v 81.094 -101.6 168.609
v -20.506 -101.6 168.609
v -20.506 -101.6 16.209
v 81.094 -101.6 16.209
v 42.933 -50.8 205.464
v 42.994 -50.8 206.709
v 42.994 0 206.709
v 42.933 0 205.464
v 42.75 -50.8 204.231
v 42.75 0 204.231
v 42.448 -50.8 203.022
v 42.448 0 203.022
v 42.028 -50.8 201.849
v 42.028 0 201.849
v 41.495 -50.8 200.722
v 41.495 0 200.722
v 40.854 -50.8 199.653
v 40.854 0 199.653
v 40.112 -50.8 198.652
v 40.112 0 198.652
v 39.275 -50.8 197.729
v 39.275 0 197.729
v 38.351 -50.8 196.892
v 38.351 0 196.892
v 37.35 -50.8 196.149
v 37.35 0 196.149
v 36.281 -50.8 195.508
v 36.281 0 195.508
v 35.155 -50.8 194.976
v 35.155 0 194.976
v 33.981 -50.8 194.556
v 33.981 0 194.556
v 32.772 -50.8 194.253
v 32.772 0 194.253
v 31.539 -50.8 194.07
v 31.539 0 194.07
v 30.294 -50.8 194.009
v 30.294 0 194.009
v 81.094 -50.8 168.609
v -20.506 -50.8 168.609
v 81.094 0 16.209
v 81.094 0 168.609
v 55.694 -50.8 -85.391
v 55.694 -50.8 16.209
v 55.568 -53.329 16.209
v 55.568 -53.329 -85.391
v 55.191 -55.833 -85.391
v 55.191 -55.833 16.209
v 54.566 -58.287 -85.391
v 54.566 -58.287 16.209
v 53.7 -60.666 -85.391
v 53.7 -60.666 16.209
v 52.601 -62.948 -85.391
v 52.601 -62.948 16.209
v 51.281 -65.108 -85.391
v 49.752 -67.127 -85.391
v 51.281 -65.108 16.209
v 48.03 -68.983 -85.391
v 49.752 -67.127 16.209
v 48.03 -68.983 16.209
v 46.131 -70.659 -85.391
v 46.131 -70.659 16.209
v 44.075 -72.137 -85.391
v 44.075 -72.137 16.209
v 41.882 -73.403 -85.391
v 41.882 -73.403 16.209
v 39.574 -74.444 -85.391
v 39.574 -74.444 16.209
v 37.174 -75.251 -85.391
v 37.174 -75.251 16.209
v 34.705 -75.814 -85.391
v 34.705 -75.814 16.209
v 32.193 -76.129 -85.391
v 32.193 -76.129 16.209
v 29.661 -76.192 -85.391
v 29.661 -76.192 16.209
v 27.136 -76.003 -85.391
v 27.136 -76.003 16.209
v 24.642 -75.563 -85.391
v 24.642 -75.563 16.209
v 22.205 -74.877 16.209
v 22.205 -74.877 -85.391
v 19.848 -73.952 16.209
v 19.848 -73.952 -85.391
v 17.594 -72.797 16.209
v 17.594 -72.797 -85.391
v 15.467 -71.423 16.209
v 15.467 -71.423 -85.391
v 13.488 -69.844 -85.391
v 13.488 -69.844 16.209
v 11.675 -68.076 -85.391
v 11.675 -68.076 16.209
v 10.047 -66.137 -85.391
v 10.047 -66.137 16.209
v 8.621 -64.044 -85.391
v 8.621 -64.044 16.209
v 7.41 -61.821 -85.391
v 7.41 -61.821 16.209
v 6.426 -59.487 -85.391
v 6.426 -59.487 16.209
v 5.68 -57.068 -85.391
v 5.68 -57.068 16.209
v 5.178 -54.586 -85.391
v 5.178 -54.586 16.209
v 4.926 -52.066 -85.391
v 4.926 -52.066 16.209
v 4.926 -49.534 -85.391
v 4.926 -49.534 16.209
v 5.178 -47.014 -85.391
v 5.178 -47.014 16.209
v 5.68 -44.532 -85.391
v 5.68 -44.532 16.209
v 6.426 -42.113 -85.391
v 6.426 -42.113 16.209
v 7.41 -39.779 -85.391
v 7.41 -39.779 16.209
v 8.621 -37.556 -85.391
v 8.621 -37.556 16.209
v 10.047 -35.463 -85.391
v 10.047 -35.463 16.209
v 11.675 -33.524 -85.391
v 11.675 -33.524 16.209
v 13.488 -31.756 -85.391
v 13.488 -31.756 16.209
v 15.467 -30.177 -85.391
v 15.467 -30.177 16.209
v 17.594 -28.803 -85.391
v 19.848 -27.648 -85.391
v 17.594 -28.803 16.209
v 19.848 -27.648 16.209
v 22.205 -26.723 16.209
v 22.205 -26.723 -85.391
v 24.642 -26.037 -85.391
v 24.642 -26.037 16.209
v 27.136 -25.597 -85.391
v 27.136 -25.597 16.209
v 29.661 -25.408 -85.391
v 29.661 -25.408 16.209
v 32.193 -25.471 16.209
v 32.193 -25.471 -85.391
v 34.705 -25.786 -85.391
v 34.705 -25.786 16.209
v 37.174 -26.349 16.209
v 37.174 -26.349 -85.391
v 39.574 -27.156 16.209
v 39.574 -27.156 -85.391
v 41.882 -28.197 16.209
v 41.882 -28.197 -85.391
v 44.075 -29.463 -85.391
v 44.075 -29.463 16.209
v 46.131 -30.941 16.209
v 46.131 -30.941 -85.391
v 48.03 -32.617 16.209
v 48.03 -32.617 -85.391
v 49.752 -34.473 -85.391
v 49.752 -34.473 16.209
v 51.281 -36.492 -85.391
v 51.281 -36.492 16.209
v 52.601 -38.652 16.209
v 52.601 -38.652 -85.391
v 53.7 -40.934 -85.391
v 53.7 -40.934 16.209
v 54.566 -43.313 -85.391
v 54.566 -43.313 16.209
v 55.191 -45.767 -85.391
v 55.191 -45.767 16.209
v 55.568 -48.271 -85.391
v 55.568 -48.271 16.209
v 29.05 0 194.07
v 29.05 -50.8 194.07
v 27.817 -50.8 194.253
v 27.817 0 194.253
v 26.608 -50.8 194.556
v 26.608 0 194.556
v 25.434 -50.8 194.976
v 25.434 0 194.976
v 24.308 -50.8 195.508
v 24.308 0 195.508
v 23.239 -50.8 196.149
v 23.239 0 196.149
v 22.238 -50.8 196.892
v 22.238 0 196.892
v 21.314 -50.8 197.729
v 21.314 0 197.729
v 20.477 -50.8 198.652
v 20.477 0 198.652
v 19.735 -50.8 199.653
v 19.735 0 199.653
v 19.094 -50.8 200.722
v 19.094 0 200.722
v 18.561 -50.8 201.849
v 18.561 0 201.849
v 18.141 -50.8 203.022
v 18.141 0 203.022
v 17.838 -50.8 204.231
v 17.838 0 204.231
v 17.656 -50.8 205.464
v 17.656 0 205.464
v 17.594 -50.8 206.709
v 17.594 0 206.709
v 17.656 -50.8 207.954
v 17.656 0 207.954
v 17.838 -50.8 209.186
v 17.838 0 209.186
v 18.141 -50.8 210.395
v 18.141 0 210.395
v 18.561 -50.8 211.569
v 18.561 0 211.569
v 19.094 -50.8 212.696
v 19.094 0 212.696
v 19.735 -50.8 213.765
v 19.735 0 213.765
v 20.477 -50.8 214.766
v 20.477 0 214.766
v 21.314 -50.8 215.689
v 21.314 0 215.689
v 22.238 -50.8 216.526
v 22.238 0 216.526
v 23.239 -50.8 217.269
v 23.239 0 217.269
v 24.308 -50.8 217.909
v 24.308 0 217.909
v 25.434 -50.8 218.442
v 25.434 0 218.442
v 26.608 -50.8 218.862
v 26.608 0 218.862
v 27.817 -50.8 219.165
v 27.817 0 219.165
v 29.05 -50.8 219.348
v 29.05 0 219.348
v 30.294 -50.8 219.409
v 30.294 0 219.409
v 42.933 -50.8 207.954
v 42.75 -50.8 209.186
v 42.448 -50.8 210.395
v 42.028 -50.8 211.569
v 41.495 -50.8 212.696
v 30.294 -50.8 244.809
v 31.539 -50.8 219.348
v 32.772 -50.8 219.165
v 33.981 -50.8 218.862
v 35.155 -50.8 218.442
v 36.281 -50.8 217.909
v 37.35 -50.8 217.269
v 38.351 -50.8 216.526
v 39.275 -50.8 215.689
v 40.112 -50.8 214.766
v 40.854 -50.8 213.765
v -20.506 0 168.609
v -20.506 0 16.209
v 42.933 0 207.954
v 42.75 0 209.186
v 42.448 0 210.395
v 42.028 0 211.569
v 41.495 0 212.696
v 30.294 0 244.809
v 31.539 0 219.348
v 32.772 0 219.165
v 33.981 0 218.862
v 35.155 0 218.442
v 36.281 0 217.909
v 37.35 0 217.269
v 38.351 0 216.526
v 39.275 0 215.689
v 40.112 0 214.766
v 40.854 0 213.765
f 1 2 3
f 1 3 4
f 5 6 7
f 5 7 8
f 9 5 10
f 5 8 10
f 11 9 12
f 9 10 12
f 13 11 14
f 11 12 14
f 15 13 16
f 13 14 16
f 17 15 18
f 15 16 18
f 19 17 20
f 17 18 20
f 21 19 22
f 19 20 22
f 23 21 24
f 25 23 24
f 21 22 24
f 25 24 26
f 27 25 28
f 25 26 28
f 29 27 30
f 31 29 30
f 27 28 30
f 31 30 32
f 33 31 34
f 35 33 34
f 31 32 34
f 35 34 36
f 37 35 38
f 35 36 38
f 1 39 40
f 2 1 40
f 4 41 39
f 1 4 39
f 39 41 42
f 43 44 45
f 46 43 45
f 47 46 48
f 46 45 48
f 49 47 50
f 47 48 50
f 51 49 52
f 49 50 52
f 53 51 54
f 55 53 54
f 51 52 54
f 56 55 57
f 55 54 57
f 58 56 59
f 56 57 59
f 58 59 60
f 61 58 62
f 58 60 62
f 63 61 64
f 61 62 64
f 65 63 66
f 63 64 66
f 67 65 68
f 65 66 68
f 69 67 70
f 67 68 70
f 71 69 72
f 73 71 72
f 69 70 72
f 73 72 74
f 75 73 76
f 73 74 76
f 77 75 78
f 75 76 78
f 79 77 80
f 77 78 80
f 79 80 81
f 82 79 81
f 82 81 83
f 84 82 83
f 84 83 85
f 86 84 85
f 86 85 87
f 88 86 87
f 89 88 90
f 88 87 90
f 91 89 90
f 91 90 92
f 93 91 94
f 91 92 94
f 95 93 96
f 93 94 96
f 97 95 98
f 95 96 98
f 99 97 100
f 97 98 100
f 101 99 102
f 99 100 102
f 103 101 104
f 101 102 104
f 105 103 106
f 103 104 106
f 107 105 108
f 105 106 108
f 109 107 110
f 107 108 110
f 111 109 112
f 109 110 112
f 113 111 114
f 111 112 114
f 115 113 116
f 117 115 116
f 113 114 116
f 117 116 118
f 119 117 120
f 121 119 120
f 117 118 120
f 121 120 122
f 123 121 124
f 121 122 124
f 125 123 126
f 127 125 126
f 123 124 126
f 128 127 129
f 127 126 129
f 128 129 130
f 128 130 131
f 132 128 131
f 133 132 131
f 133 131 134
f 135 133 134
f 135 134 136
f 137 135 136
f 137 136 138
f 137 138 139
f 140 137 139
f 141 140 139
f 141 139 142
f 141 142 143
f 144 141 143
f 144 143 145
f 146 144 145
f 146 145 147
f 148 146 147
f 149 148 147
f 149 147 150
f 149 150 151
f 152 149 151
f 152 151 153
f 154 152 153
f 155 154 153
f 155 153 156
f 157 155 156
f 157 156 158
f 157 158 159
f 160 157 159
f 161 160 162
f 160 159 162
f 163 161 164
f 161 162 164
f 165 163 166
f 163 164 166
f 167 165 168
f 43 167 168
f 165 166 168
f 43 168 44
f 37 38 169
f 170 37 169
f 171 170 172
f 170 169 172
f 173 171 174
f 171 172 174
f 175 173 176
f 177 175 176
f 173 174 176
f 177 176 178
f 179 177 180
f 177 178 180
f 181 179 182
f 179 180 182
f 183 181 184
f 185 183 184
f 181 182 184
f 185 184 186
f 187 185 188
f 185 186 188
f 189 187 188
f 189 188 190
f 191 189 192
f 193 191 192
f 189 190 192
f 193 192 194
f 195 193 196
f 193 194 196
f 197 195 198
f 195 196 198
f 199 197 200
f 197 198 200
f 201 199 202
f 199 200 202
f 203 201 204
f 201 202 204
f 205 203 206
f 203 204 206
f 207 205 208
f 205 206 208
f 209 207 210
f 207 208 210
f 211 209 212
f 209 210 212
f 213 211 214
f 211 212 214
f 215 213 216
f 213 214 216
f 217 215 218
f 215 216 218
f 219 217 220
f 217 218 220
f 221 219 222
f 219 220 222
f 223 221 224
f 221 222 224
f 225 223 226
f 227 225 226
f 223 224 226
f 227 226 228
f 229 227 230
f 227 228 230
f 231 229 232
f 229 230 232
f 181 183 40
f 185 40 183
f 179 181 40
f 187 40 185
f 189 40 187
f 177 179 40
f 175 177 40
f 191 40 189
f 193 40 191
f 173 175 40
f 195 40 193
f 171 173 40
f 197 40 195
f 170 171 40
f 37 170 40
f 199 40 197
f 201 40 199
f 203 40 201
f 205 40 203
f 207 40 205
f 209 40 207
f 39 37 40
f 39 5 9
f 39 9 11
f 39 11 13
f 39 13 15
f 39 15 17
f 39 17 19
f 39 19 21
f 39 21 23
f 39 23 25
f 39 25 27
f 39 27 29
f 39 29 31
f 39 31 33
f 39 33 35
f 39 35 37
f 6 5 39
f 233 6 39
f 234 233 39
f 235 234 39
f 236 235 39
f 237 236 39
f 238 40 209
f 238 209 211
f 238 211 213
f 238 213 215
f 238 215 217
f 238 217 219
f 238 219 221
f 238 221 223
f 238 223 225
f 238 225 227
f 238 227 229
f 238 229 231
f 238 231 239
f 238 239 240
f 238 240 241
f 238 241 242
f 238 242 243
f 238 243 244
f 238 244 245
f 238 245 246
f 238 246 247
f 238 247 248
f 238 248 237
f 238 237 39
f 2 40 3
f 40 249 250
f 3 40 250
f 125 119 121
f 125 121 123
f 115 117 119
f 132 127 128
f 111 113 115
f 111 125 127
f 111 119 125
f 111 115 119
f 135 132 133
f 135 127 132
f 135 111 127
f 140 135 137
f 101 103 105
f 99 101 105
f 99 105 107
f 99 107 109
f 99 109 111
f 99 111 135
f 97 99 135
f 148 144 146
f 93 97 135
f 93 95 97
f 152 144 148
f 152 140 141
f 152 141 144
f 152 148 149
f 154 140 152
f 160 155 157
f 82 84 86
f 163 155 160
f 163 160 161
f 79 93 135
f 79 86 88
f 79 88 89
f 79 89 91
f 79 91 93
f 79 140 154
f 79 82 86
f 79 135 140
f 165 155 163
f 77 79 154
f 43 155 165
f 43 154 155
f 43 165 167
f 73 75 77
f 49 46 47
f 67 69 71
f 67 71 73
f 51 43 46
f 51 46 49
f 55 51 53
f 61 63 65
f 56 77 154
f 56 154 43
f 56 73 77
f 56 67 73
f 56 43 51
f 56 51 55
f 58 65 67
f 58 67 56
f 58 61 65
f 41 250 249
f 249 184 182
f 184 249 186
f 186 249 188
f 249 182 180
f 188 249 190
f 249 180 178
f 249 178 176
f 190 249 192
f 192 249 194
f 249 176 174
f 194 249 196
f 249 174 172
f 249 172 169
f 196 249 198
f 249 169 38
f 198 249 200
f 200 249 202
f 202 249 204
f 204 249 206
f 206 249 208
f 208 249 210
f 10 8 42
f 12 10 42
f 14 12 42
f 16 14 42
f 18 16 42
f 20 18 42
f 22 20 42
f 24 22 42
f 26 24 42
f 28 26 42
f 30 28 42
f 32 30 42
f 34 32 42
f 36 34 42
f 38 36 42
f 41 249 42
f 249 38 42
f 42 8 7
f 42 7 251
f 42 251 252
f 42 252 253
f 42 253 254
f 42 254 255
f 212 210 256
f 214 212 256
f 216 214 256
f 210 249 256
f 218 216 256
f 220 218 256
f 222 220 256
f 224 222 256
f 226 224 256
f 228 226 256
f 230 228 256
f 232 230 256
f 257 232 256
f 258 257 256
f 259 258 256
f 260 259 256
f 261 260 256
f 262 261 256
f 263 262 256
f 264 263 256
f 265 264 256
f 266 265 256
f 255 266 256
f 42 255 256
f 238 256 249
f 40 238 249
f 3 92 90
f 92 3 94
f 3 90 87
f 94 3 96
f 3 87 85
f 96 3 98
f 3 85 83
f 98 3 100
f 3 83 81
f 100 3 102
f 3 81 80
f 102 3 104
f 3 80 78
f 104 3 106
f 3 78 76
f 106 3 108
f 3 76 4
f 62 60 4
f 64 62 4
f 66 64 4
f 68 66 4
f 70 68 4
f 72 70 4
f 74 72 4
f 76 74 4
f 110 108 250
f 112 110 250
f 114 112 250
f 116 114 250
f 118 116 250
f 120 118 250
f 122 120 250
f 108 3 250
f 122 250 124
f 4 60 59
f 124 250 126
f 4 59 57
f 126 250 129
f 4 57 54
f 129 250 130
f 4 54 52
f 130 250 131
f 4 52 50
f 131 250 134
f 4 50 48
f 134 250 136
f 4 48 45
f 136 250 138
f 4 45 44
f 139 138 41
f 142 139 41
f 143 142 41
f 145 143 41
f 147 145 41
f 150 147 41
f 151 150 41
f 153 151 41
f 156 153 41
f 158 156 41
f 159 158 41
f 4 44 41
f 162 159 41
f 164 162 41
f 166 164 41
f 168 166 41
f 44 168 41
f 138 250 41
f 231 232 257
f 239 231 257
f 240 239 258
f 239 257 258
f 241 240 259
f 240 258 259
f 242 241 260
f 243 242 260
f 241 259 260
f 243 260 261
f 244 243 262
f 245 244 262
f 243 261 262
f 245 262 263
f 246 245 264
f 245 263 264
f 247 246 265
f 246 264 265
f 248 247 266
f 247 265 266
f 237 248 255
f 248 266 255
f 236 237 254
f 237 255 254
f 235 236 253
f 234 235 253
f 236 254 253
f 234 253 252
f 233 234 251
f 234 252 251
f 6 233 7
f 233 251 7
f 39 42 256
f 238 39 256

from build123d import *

# Parameters (mm, degrees)
F1_DEPTH = 101.6
F2_DEPTH = 50.8
F3_R     = 25.4
F4_DEPTH = 101.6


with BuildPart() as f1:
    # F0 (on Front) → F1 (new body)
    with BuildSketch(Plane.XZ):
        Polygon((30.294443, 168.60885), (-20.505557, 168.60885), (-20.505557, 16.20885), (81.094443, 16.20885), (81.094443, 168.60885), align=None)
    extrude(amount=F1_DEPTH)

    # F0 (on Front) → F2 (join)
    with BuildSketch(Plane.XZ):
        with BuildLine():
            Line((30.294443, 244.80885), (-20.505557, 168.60885))
            Line((-20.505557, 168.60885), (30.294443, 168.60885))
            Line((30.294443, 168.60885), (30.294443, 194.00885))
            ThreePointArc((30.294443, 194.00885), (17.594443, 206.70885), (30.294443, 219.40885))
            Line((30.294443, 219.40885), (30.294443, 244.80885))
        make_face()
        Polygon((30.294443, 168.60885), (-20.505557, 168.60885), (-20.505557, 16.20885), (81.094443, 16.20885), (81.094443, 168.60885), align=None)
        with BuildLine():
            Line((30.294443, 194.00885), (30.294443, 168.60885))
            Line((30.294443, 168.60885), (81.094443, 168.60885))
            Line((81.094443, 168.60885), (30.294443, 244.80885))
            Line((30.294443, 244.80885), (30.294443, 219.40885))
            ThreePointArc((30.294443, 219.40885), (39.274699, 215.689107), (42.994443, 206.70885))
            ThreePointArc((42.994443, 206.70885), (39.274699, 197.728594), (30.294443, 194.00885))
        make_face()
    extrude(amount=F2_DEPTH)

    # F3 (on face) → F4 (join)
    with BuildSketch(Plane(origin=(0, 0, 16.20885), x_dir=(1, 0, 0), z_dir=(0, 0, -1))):
        with Locations((30.294443, 50.8)):
            Circle(F3_R)
    extrude(amount=F4_DEPTH)


solid = f1.part
